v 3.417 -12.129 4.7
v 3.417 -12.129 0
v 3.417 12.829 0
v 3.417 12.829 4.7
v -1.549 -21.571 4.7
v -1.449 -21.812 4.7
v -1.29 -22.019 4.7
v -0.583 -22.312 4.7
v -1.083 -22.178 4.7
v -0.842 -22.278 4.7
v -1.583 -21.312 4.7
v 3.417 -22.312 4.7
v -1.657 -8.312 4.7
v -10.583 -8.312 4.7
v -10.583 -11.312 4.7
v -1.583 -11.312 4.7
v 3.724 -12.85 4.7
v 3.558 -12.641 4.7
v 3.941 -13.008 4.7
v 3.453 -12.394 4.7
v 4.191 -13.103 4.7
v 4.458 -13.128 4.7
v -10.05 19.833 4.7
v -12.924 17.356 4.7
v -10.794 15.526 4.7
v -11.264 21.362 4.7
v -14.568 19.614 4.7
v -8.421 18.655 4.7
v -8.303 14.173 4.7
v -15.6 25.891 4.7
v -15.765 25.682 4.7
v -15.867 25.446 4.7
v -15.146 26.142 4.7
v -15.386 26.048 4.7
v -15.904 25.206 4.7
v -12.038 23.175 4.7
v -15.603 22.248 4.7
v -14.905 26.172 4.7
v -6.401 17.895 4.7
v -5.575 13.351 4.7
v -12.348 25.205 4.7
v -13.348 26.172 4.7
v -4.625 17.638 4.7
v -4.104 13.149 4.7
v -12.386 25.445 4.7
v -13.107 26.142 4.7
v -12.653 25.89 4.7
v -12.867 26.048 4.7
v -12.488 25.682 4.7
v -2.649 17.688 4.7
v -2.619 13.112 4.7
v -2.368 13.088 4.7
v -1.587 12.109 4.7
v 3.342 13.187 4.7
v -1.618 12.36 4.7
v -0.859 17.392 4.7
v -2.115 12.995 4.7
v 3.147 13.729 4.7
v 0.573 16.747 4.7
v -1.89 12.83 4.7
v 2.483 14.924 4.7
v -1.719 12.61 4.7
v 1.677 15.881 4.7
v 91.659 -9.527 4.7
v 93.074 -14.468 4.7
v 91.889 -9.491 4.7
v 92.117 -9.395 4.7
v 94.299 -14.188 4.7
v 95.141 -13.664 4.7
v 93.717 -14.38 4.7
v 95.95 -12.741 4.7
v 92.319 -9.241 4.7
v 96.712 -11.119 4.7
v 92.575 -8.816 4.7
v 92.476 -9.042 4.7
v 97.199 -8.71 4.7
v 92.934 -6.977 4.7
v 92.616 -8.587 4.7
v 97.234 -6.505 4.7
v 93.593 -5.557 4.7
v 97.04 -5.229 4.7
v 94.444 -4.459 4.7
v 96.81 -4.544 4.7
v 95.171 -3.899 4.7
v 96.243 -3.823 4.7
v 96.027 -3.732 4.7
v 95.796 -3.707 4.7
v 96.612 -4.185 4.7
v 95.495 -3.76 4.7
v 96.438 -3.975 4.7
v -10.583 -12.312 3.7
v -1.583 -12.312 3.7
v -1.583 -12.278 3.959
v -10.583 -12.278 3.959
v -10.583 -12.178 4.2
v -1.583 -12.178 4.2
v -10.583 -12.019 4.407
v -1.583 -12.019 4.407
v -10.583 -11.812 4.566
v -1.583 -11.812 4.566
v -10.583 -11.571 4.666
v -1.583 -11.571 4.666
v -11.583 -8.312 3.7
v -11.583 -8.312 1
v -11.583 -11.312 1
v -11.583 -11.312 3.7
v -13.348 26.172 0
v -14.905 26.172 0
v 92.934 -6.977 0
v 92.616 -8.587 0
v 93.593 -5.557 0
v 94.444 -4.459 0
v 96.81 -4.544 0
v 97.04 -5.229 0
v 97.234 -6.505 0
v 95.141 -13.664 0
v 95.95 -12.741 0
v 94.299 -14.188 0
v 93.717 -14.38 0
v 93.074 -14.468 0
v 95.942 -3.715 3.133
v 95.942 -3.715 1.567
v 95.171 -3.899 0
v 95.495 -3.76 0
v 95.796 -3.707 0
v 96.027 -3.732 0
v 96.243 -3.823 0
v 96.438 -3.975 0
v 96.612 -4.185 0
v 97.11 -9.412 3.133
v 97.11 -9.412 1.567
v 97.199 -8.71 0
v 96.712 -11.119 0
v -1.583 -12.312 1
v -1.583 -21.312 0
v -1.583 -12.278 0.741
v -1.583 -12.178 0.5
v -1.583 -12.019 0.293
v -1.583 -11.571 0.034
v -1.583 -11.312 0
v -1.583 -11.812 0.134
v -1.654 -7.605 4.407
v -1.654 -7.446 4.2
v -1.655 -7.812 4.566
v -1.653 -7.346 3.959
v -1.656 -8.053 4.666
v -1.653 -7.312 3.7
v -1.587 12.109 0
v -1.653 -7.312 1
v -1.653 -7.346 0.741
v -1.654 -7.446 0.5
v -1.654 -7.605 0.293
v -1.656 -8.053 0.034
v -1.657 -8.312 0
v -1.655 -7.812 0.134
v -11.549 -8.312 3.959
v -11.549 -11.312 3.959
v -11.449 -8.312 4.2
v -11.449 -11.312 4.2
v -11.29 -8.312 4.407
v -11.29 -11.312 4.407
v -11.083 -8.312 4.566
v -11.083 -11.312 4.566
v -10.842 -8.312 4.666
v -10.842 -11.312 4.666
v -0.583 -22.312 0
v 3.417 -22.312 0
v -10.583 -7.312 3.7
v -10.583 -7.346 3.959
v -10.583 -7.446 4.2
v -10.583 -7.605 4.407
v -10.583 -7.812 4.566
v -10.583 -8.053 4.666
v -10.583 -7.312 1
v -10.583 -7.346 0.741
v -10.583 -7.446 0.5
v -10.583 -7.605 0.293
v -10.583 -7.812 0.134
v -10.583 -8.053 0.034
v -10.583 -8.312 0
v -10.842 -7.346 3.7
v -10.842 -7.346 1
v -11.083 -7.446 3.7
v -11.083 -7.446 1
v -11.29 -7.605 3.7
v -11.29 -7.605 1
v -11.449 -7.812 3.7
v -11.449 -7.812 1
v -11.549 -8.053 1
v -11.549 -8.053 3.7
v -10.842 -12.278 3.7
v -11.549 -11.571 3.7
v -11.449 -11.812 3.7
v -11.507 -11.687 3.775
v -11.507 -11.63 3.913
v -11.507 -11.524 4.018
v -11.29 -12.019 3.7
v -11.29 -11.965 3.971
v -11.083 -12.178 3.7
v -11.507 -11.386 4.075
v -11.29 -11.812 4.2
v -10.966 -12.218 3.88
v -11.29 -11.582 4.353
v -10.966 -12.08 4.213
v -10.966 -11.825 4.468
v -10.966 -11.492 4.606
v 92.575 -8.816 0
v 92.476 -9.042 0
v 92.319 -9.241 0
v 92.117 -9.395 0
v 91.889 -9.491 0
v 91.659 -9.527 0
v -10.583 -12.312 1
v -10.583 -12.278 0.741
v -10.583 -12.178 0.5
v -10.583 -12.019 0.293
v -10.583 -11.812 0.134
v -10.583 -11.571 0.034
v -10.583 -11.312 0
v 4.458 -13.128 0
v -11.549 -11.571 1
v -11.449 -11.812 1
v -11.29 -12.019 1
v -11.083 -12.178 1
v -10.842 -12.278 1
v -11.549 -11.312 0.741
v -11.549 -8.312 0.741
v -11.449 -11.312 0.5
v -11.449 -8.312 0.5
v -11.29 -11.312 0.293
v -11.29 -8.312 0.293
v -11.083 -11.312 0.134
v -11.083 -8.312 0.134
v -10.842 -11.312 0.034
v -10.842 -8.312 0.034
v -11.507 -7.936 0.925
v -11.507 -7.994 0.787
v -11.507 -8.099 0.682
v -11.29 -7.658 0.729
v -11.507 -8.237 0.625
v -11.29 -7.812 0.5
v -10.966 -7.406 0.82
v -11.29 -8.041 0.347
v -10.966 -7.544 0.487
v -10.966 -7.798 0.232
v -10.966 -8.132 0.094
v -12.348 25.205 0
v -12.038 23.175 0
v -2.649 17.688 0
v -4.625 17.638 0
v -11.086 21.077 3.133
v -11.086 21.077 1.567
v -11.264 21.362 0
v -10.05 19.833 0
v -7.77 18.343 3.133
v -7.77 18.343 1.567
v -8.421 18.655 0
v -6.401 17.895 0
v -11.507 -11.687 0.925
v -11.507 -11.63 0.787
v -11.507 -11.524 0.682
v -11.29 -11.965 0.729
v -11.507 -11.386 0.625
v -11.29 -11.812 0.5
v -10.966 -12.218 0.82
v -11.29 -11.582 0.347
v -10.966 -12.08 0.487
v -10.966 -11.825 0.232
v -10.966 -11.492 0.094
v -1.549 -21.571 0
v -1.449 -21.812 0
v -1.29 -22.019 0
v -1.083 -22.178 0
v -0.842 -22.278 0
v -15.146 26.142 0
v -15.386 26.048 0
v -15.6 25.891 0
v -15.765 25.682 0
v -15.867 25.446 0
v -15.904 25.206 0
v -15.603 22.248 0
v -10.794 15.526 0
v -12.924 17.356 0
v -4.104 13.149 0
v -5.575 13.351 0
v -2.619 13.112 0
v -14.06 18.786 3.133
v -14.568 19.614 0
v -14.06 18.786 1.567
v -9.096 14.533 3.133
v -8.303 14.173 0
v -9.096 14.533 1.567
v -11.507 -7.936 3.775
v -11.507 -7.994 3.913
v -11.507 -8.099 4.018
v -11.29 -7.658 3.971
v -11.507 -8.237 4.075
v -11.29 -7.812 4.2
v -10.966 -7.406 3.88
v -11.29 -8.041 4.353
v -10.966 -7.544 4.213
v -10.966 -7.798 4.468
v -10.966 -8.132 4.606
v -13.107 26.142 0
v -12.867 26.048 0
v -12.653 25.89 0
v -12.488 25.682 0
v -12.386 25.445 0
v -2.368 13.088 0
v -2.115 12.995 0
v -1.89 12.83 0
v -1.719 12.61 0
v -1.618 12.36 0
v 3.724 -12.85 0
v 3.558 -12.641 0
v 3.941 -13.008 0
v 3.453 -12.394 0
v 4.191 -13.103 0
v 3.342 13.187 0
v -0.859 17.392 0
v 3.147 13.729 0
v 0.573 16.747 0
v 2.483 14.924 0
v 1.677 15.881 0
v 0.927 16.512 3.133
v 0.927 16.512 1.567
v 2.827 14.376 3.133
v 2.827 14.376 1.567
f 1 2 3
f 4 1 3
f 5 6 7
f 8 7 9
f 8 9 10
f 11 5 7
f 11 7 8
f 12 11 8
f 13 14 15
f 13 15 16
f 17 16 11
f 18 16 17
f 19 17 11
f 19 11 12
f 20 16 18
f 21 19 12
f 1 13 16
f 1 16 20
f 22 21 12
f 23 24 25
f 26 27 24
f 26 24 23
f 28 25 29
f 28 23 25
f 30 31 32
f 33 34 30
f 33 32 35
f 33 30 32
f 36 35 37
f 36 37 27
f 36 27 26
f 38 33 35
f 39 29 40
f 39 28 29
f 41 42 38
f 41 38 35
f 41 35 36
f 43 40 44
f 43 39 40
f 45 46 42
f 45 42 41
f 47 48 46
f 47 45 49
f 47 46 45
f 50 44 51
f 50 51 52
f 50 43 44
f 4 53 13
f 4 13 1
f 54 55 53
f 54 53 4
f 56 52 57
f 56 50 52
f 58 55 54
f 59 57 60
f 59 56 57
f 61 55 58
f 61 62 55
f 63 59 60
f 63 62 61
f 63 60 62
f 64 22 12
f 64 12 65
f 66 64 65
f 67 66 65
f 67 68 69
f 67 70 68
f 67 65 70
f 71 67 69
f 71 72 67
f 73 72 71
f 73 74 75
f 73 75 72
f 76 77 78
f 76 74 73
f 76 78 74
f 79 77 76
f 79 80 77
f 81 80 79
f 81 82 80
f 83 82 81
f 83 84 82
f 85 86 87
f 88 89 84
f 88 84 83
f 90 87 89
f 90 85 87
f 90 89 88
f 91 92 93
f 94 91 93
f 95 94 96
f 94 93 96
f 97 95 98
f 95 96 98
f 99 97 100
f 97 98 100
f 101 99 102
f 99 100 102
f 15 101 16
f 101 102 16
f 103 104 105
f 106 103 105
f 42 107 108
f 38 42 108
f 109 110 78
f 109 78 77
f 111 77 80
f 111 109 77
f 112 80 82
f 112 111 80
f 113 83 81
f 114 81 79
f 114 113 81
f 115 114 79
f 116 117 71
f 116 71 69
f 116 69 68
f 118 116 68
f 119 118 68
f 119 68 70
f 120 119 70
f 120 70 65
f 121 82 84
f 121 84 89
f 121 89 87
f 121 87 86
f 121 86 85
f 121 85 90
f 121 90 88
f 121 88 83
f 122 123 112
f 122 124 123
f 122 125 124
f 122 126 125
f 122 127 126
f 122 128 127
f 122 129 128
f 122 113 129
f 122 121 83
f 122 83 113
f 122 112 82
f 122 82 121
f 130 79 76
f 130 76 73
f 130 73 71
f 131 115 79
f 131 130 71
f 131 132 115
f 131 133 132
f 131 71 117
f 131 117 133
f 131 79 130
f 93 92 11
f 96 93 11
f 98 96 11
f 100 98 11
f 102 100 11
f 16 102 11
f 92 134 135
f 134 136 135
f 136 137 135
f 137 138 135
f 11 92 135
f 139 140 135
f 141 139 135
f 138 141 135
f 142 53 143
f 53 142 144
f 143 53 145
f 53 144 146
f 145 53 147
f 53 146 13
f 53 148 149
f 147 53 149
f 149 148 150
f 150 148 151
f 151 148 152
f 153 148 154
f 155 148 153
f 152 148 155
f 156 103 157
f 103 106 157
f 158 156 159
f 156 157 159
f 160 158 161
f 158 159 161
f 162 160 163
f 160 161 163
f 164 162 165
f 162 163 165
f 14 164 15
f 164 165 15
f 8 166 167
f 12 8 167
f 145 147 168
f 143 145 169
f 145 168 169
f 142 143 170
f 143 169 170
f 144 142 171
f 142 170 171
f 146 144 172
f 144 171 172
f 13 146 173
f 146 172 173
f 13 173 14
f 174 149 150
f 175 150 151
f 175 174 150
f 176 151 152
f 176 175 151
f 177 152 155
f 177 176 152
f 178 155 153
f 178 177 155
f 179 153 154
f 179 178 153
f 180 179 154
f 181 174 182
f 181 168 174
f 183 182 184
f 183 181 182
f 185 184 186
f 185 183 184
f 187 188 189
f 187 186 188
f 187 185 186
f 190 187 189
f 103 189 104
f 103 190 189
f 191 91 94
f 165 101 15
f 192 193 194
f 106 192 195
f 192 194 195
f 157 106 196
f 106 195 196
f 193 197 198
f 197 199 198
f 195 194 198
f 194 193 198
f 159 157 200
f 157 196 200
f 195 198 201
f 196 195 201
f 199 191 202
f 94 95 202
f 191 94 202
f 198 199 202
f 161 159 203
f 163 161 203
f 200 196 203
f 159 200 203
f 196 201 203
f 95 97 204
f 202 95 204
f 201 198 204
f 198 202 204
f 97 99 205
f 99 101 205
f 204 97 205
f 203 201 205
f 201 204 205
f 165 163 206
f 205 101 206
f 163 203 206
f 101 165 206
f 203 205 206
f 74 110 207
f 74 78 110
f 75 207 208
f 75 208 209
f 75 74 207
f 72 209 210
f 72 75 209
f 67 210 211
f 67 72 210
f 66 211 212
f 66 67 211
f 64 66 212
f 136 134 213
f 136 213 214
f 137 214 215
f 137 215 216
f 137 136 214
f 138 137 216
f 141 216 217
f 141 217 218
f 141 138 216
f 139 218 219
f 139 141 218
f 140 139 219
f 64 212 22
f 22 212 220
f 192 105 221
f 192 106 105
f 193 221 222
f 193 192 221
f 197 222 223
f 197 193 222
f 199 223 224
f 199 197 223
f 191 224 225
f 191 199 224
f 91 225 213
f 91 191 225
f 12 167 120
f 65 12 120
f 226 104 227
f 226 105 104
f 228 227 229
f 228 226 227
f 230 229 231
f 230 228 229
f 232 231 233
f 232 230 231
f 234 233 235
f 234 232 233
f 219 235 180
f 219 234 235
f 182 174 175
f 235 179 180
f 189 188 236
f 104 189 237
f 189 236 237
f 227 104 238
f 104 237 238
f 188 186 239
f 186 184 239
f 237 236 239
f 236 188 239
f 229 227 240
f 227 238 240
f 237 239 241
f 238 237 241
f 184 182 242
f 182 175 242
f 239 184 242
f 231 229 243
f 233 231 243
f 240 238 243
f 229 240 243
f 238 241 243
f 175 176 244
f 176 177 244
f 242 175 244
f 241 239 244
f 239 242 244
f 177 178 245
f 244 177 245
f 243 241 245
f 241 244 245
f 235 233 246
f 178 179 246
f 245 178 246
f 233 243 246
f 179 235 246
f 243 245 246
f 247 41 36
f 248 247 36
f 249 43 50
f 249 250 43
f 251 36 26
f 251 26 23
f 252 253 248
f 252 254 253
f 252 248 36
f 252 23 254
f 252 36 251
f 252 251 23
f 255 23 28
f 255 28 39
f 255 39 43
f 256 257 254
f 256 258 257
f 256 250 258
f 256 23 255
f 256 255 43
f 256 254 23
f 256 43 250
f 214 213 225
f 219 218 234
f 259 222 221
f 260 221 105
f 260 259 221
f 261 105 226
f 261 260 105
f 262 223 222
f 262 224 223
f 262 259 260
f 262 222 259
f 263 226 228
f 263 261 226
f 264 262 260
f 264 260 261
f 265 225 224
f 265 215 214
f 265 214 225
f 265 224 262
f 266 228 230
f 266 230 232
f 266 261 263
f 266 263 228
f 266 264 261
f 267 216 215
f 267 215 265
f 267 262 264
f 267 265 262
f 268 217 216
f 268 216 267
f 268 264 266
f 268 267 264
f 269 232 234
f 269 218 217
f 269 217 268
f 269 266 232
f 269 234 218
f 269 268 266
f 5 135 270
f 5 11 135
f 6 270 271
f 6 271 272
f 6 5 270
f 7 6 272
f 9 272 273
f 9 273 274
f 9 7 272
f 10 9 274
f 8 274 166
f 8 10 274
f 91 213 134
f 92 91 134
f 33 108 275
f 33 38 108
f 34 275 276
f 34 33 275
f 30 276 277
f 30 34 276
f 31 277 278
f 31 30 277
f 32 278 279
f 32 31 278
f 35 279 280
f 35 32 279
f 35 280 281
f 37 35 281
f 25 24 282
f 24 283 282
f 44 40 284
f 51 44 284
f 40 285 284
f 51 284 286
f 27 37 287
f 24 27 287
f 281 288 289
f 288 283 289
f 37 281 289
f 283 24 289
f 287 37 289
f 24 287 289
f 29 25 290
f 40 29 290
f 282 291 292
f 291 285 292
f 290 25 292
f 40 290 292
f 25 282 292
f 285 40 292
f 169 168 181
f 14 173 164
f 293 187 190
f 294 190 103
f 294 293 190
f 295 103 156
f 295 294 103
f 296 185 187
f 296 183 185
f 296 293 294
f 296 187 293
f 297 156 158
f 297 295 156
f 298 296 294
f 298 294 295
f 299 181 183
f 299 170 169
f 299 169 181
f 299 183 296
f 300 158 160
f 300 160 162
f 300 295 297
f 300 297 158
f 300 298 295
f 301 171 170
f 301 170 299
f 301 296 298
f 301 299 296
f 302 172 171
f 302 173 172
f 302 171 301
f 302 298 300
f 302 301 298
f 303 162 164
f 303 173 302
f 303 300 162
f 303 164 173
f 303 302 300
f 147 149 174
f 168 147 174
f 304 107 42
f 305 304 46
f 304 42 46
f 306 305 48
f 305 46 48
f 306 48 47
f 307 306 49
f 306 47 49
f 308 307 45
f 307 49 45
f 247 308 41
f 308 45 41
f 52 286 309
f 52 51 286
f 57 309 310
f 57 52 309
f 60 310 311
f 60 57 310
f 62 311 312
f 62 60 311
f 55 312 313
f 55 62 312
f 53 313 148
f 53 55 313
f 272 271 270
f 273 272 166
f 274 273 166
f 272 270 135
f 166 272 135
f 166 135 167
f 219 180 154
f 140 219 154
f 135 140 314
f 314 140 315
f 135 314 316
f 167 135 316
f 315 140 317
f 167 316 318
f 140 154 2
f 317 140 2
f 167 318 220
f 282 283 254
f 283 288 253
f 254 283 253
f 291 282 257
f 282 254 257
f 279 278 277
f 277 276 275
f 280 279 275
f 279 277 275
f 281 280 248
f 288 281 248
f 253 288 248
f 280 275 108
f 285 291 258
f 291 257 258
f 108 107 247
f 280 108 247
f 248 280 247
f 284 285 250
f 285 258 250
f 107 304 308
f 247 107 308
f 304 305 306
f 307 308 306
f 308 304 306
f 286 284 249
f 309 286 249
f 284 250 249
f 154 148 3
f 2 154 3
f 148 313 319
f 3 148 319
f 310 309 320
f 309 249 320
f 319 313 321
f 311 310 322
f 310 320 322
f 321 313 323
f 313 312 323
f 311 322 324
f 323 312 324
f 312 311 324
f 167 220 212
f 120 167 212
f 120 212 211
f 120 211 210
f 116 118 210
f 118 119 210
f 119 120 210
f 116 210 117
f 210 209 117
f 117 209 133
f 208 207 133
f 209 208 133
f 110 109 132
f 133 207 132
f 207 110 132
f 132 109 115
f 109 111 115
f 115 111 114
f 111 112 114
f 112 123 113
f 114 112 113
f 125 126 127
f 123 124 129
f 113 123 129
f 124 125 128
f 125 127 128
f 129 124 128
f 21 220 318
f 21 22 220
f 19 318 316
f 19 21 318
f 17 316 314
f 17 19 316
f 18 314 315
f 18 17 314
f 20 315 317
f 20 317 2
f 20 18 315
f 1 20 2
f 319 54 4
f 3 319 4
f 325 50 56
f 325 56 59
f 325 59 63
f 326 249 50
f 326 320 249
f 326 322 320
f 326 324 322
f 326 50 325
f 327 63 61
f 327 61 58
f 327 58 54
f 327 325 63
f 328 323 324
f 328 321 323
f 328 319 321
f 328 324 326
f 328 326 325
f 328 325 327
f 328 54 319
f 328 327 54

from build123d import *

# Parameters (mm, degrees)
F1_DEPTH = 4.7
F2_R     = 1


with BuildPart() as f1:
    # F0 (on Top) → F1 (new body)
    with BuildSketch(Plane.XY):
        with BuildLine():
            Line((-12.3301572212, 26.1715785798), (-15.8301572212, 26.1715785798))
            add(Edge.make_bspline(
                [(-15.8301572212, 26.1715785798), (-16.7997692679, 17.9848263993), (-8.8800950357, 12.3493980705), (-1.5833711872, 13.1881022432)],
                knots=[0, 0, 0, 0, 19.2754136163, 19.2754136163, 19.2754136163, 19.2754136163], degree=3))
            Line((-1.5833711872, 13.1881022432), (-1.6532300643, -7.3117787256))
            Line((-1.6532300643, -7.3117787256), (-11.5833711872, -7.3117787256))
            Line((-11.5833711872, -7.3117787256), (-11.5833711872, -12.3117787256))
            Line((-11.5833711872, -12.3117787256), (-1.5833711872, -12.3117787256))
            Line((-1.5833711872, -12.3117787256), (-1.5833711872, -22.3117787256))
            Line((-1.5833711872, -22.3117787256), (3.4166288128, -22.3117787256))
            Line((3.4166288128, -22.3117787256), (93.074151641, -14.4677618783))
            Line((93.074151641, -14.4677618783), (92.6383729273, -9.4867883879))
            Line((92.6383729273, -9.4867883879), (3.4166288128, -13.1708589983))
            Line((3.4166288128, -13.1708589983), (3.4166288128, 12.8291410017))
            add(Edge.make_bspline(
                [(-2.649059402, 17.6881022432), (1.8865002444, 17.5075998859), (3.3608573382, 13.5643548658), (3.4166288128, 12.8291410017)],
                knots=[0, 0, 0, 0, 7.7718773708, 7.7718773708, 7.7718773708, 7.7718773708], degree=3))
            add(Edge.make_bspline(
                [(-12.3301572212, 26.1715785798), (-12.6828875853, 21.1161755461), (-8.9998222388, 17.0332827738), (-2.649059402, 17.6881022432)],
                knots=[0, 0, 0, 0, 12.8721803023, 12.8721803023, 12.8721803023, 12.8721803023], degree=3))
        make_face()
        with BuildLine():
            add(Edge.make_bspline(
                [(92.6383729273, -9.4867883879), (92.3075102355, -6.5398698428), (96.8060362316, -0.7143486372), (97.8576879629, -9.9857558243), (95.4716324541, -14.3468420863), (93.074151641, -14.4677618783)],
                knots=[0, 0, 0, 0, 0.3422957302, 0.6624021544, 1, 1, 1, 1], degree=3))
            Line((92.6383729273, -9.4867883879), (93.074151641, -14.4677618783))
        make_face()
    extrude(amount=F1_DEPTH)

    # F2
    f2_edges = [f1.edges().sort_by_distance(p)[0] for p in [
        (-6.618301, -7.311779, 4.7),
        (-6.583371, -12.311779, 4.7),
        (-6.618301, -7.311779, 0),
        (-6.583371, -12.311779, 0),
        (-11.583371, -7.311779, 2.35),
        (-11.583371, -12.311779, 2.35),
        (-11.583371, -9.811779, 0),
        (-11.583371, -9.811779, 4.7),
        (-15.830157, 26.171579, 2.35),
        (-12.330157, 26.171579, 2.35),
        (-1.583371, 13.188102, 2.35),
        (-1.583371, -22.311779, 2.35),
        (92.638373, -9.486788, 2.35),
        (3.416629, -13.170859, 2.35),
    ]]
    fillet(f2_edges, radius=F2_R)


solid = f1.part
